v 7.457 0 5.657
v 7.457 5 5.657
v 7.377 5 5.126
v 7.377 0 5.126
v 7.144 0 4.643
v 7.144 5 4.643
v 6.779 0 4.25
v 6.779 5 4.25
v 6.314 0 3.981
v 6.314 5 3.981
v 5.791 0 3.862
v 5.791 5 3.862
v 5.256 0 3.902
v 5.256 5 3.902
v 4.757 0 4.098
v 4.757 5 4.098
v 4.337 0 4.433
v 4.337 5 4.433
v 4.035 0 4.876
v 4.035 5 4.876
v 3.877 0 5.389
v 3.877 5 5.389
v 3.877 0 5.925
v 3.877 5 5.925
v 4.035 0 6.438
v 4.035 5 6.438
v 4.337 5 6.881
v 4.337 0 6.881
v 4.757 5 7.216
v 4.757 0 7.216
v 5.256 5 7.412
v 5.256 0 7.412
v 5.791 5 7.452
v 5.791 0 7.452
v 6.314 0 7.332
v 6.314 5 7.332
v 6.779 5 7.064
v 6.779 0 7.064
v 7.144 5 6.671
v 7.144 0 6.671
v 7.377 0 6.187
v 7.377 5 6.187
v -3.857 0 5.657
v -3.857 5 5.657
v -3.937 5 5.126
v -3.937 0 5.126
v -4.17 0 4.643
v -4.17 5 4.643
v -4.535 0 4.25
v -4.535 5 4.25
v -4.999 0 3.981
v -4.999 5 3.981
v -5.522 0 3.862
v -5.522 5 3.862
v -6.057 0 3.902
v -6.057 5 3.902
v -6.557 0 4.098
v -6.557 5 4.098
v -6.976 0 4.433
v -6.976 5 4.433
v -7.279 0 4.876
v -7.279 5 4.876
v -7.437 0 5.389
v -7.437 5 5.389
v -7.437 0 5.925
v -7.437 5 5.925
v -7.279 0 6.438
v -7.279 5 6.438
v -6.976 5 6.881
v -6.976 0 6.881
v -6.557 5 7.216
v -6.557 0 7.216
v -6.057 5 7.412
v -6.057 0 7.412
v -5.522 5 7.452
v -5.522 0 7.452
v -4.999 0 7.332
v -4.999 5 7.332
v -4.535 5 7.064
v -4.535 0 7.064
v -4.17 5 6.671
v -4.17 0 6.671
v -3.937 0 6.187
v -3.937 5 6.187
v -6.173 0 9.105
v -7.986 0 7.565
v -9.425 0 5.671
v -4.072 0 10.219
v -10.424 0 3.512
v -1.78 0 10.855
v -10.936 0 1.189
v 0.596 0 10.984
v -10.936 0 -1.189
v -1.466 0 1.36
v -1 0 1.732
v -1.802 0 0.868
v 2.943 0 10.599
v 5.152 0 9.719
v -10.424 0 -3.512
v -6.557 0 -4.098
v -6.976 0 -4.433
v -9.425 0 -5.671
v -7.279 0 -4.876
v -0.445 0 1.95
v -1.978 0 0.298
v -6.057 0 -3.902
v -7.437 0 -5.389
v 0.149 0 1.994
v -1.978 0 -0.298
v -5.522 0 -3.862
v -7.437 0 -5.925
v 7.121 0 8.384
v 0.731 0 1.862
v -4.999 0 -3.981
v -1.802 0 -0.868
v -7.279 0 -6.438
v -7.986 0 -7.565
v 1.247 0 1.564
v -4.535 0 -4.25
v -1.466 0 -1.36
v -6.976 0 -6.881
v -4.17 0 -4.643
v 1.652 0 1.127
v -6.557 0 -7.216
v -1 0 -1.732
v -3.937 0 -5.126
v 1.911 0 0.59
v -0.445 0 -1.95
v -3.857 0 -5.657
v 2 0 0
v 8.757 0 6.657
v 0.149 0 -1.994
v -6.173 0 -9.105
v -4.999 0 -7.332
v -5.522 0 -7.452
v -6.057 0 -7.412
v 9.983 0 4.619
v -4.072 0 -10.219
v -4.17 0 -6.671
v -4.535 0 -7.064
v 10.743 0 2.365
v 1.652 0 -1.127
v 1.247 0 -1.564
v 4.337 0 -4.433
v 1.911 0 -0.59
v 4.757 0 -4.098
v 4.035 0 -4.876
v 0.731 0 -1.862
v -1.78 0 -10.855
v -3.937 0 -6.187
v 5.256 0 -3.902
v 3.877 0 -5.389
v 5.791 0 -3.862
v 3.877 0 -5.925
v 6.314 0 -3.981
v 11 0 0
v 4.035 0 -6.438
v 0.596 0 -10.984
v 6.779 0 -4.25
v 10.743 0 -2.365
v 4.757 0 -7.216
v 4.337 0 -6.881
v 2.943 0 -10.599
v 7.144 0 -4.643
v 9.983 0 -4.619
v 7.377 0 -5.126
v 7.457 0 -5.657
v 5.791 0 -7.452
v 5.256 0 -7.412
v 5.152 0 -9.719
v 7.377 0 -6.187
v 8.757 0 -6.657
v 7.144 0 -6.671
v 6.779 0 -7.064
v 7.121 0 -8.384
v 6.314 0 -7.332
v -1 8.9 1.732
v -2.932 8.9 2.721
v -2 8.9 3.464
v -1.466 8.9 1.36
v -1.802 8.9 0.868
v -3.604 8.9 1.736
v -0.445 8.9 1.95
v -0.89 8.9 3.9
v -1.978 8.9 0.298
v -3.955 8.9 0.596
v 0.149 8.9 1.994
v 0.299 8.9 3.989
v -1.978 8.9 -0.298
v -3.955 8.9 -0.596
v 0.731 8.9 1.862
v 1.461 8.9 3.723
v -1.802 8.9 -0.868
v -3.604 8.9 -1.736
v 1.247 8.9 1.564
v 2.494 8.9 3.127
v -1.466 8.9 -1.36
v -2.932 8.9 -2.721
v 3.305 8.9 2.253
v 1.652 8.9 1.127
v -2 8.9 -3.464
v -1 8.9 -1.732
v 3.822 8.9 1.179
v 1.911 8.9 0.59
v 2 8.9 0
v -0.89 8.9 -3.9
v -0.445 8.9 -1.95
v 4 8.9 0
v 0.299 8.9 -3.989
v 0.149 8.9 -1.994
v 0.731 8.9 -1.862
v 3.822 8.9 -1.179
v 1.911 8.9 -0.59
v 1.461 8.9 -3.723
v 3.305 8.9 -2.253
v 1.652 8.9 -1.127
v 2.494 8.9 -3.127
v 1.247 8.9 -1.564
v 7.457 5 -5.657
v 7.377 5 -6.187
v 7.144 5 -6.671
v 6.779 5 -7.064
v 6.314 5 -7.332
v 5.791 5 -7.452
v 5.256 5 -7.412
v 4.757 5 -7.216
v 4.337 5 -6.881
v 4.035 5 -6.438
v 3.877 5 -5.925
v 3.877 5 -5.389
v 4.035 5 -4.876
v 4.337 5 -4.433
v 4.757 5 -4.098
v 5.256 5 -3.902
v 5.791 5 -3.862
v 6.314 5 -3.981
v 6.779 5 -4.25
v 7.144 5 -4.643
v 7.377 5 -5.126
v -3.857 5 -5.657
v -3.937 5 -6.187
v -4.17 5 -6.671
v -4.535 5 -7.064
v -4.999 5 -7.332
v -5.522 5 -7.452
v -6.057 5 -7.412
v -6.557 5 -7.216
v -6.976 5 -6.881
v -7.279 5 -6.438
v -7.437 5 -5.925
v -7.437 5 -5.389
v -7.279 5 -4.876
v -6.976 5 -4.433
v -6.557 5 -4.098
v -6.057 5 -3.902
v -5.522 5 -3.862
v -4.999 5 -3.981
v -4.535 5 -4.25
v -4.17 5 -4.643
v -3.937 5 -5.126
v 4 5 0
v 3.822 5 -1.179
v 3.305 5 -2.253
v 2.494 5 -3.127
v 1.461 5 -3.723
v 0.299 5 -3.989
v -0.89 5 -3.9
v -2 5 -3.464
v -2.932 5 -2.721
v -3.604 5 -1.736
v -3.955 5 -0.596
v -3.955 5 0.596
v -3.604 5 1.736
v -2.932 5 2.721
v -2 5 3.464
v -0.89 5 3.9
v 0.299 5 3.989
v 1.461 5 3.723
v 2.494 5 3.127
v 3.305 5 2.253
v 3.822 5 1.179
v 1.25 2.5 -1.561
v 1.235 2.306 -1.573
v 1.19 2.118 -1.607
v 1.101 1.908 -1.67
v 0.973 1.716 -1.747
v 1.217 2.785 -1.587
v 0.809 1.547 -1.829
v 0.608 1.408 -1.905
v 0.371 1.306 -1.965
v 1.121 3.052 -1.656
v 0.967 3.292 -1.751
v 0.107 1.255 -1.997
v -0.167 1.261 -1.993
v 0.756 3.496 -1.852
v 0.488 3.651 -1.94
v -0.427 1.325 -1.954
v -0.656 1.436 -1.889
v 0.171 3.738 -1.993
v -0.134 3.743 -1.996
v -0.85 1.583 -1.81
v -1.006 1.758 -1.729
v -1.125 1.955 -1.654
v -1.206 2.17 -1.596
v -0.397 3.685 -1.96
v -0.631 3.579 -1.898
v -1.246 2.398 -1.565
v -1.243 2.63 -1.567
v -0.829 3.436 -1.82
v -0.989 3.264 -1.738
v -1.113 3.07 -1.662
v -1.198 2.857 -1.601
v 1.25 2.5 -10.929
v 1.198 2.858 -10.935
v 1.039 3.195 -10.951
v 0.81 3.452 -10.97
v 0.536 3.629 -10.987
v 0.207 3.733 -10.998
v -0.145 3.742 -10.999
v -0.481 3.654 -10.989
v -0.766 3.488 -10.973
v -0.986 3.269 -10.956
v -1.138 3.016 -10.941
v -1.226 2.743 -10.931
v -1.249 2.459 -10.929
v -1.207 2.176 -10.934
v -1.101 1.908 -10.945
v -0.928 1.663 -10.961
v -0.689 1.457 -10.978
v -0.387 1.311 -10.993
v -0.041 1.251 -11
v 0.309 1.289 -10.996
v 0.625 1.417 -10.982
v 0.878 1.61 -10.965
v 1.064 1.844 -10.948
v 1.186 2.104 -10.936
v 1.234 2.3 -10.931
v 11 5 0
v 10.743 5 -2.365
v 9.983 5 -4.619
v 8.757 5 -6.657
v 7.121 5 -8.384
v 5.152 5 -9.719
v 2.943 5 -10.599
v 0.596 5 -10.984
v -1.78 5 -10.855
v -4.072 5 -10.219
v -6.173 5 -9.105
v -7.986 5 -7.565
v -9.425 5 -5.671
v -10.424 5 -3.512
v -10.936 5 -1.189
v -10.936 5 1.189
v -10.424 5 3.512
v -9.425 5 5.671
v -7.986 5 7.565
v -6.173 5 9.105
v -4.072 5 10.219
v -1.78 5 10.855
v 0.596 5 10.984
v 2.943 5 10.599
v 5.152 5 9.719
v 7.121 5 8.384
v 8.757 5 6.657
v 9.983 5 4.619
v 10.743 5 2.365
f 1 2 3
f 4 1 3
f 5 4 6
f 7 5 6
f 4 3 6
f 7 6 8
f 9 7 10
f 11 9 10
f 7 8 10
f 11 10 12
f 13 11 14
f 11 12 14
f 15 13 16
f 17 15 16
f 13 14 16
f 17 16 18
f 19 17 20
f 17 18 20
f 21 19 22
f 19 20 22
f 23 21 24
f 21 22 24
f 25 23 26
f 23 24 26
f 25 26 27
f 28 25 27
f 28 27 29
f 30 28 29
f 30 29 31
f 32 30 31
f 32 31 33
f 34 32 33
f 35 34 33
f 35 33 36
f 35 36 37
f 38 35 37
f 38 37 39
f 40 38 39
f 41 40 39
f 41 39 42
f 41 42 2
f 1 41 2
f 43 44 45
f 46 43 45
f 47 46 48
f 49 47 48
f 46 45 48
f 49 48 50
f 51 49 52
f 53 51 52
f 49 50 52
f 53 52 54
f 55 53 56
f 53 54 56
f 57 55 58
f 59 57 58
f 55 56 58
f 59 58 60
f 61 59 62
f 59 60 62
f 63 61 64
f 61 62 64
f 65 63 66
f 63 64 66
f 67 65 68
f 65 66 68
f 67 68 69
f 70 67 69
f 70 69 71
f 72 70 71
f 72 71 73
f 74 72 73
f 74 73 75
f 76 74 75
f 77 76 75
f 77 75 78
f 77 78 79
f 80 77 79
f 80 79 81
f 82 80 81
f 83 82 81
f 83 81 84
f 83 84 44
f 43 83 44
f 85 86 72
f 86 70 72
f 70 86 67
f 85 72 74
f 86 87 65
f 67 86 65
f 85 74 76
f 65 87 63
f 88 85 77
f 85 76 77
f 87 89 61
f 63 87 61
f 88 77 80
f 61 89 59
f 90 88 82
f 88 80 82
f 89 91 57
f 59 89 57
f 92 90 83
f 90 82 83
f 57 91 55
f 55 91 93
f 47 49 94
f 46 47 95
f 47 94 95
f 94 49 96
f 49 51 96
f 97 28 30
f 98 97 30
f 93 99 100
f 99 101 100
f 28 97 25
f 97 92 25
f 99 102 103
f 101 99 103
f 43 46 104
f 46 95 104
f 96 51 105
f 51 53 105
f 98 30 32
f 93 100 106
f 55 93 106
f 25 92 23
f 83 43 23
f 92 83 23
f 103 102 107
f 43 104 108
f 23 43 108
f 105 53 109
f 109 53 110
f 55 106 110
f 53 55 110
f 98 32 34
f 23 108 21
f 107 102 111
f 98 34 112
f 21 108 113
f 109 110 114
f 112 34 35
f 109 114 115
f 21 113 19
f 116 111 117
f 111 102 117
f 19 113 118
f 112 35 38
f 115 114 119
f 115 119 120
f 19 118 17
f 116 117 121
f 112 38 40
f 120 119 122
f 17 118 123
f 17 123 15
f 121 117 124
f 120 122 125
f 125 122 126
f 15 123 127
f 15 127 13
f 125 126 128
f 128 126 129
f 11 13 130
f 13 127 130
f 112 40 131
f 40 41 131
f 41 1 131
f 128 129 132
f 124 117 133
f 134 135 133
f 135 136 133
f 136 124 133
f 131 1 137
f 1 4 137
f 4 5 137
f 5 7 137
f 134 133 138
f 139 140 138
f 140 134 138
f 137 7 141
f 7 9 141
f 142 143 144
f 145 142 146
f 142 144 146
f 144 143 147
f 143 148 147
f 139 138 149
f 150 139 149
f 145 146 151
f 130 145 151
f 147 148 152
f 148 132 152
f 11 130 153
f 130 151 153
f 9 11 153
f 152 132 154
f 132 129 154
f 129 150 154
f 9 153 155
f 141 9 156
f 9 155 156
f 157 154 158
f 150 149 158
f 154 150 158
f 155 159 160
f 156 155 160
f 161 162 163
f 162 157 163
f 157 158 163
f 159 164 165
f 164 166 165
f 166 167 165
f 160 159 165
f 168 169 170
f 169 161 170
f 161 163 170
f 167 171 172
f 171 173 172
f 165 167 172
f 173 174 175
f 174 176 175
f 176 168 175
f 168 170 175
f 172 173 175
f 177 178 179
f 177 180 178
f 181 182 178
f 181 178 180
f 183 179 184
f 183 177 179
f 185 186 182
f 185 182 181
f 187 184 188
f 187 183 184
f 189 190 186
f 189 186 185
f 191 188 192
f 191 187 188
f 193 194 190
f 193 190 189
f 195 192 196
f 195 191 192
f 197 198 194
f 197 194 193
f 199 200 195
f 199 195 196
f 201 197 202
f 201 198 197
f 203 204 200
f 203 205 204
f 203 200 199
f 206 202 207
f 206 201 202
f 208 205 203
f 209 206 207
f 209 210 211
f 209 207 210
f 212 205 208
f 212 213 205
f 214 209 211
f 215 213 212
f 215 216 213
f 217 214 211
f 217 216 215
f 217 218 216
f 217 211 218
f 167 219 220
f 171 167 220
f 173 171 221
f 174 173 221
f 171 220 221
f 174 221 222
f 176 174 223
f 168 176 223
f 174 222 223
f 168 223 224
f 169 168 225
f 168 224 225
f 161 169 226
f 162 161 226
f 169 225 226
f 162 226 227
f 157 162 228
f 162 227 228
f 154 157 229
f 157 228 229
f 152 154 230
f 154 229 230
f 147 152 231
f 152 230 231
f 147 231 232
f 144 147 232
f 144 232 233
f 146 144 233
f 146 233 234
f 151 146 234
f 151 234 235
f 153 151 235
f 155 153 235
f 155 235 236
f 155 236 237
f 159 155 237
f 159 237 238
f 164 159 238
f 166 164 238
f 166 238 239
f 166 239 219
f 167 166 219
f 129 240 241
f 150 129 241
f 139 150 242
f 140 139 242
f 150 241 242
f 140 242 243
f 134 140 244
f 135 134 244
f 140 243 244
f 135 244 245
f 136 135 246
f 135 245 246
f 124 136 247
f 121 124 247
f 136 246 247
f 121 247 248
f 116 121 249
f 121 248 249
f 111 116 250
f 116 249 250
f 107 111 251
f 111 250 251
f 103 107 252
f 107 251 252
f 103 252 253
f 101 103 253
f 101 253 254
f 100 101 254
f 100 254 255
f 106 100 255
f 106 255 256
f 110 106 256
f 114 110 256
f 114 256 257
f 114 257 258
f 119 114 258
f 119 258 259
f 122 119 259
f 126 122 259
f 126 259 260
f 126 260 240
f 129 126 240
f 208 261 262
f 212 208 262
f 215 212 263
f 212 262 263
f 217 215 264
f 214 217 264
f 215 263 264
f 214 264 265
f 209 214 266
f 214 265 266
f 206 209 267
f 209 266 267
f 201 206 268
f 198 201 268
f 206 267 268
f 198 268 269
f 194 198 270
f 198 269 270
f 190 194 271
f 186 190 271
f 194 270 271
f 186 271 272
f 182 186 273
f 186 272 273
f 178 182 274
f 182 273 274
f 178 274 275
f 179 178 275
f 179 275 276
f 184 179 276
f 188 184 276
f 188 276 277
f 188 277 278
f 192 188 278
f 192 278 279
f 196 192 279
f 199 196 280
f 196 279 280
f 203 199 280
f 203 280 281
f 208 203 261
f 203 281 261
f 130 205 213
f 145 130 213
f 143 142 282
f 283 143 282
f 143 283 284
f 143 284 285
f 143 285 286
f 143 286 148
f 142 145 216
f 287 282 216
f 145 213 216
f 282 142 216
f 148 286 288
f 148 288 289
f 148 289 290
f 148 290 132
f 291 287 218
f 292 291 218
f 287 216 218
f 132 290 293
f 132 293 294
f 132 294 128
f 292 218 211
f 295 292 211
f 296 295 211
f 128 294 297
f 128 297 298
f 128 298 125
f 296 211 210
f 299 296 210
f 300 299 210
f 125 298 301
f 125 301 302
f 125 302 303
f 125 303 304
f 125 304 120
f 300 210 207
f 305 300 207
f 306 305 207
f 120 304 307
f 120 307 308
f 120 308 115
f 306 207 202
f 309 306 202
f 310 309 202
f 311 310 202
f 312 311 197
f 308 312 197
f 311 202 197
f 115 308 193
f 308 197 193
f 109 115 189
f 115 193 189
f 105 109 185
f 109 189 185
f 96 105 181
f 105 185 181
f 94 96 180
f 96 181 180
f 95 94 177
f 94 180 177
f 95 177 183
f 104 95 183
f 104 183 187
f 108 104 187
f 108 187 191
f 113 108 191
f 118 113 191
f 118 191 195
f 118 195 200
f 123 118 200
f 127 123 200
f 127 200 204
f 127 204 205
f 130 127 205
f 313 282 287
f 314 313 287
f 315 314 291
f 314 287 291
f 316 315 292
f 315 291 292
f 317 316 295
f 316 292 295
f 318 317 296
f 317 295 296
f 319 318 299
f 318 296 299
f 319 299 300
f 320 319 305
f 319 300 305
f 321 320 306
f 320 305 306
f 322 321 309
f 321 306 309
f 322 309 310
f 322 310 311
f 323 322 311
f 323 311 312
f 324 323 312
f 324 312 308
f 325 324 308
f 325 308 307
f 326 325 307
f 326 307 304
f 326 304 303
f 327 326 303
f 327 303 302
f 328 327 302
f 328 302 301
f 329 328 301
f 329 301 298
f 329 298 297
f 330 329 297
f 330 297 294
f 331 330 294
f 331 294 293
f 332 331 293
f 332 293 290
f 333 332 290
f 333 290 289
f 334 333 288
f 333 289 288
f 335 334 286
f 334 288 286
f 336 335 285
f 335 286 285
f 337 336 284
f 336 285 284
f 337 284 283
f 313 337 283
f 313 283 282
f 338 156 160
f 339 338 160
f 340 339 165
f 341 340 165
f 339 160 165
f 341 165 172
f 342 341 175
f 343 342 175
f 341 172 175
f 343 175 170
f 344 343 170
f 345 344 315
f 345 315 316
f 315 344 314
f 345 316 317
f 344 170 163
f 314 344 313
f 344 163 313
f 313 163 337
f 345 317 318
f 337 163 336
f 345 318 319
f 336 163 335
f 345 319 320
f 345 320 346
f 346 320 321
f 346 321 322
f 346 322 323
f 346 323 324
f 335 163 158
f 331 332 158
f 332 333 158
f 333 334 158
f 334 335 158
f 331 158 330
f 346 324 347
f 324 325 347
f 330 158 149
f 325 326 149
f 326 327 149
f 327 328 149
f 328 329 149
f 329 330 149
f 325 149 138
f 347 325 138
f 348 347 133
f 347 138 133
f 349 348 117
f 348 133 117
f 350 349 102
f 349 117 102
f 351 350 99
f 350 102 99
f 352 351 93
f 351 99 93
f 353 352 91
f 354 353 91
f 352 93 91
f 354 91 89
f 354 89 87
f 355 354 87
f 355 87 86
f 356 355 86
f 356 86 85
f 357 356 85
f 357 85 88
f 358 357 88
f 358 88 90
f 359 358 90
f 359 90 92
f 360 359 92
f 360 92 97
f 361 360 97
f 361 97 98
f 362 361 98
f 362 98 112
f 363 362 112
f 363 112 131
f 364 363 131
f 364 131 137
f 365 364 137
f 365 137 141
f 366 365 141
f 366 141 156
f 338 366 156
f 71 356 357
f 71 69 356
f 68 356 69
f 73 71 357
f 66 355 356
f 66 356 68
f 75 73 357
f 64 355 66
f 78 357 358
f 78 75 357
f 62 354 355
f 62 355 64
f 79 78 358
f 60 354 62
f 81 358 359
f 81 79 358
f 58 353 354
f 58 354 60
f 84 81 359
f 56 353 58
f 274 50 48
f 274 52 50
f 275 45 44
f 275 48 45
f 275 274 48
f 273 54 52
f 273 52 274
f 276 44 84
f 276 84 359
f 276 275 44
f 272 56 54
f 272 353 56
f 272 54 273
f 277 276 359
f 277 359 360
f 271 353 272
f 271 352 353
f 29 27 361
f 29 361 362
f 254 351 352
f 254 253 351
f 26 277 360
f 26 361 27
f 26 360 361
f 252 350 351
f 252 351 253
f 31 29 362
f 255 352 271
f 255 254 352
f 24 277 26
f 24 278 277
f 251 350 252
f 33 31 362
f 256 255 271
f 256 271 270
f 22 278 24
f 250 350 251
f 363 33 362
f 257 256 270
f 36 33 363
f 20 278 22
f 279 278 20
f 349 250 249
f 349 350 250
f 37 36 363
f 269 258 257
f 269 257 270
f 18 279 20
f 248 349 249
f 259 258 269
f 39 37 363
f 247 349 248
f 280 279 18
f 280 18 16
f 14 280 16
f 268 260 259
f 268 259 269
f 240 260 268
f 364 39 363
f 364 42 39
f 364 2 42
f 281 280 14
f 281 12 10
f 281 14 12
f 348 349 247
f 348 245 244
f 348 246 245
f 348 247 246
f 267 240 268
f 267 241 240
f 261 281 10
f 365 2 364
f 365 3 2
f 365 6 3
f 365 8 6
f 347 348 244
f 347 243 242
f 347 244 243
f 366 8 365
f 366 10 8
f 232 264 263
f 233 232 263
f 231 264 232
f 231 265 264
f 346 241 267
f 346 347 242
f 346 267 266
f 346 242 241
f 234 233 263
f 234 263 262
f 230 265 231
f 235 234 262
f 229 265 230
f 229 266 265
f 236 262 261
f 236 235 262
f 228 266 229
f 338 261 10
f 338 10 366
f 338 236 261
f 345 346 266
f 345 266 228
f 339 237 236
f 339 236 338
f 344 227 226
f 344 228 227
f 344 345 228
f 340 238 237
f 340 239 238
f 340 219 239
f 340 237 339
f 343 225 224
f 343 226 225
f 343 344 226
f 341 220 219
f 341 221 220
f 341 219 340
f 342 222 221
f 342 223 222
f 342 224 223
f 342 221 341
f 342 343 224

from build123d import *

# Parameters (mm, degrees)
SKETCH_1_R          = 11
EXTRUDE_1_DEPTH     = 5
SKETCH_2_R          = 4
EXTRUDE_2_DEPTH     = 3.9
SKETCH_3_R          = 1.8
CUT_EXTRUDE_1_DEPTH = 6
SKETCH_4_R          = 2
CUT_EXTRUDE_2_DEPTH = 9.9
SKETCH_6_R          = 1.25
CUT_EXTRUDE_3_DEPTH = 13


with BuildPart() as part:
    # 스케치1 → 보스-돌출1 (new body)
    with BuildSketch(Plane(origin=(0, 0, 0), x_dir=(1, 0, 0), z_dir=(0, 1, 0))):
        Circle(SKETCH_1_R)
    extrude(amount=EXTRUDE_1_DEPTH)

    # 스케치2 → 보스-돌출2 (add)
    with BuildSketch(Plane(origin=(0, 5, 0), x_dir=(1, 0, 0), z_dir=(0, 1, 0))):
        Circle(SKETCH_2_R)
    extrude(amount=EXTRUDE_2_DEPTH)

    # 스케치3 → 컷-돌출1 (cut, through all)
    with BuildSketch(Plane(origin=(0, 5, 0), x_dir=(1, 0, 0), z_dir=(0, 1, 0))):
        with Locations((5.656854249, 5.656854249)):
            Circle(SKETCH_3_R)
        with Locations((-5.656854249, -5.656854249)):
            Circle(SKETCH_3_R)
        with Locations((-5.656854249, 5.656854249)):
            Circle(SKETCH_3_R)
        with Locations((5.656854249, -5.656854249)):
            Circle(SKETCH_3_R)
    extrude(amount=-CUT_EXTRUDE_1_DEPTH, mode=Mode.SUBTRACT)

    # 스케치4 → 컷-돌출2 (cut, through all)
    with BuildSketch(Plane(origin=(0, 8.9, 0), x_dir=(1, 0, 0), z_dir=(0, 1, 0))):
        Circle(SKETCH_4_R)
    extrude(amount=-CUT_EXTRUDE_2_DEPTH, mode=Mode.SUBTRACT)

    # 스케치6 → 컷-돌출3 (cut)
    with BuildSketch(Plane.XY):
        with Locations((0, 2.5)):
            Circle(SKETCH_6_R)
    extrude(amount=-CUT_EXTRUDE_3_DEPTH, mode=Mode.SUBTRACT)


solid = part.part
